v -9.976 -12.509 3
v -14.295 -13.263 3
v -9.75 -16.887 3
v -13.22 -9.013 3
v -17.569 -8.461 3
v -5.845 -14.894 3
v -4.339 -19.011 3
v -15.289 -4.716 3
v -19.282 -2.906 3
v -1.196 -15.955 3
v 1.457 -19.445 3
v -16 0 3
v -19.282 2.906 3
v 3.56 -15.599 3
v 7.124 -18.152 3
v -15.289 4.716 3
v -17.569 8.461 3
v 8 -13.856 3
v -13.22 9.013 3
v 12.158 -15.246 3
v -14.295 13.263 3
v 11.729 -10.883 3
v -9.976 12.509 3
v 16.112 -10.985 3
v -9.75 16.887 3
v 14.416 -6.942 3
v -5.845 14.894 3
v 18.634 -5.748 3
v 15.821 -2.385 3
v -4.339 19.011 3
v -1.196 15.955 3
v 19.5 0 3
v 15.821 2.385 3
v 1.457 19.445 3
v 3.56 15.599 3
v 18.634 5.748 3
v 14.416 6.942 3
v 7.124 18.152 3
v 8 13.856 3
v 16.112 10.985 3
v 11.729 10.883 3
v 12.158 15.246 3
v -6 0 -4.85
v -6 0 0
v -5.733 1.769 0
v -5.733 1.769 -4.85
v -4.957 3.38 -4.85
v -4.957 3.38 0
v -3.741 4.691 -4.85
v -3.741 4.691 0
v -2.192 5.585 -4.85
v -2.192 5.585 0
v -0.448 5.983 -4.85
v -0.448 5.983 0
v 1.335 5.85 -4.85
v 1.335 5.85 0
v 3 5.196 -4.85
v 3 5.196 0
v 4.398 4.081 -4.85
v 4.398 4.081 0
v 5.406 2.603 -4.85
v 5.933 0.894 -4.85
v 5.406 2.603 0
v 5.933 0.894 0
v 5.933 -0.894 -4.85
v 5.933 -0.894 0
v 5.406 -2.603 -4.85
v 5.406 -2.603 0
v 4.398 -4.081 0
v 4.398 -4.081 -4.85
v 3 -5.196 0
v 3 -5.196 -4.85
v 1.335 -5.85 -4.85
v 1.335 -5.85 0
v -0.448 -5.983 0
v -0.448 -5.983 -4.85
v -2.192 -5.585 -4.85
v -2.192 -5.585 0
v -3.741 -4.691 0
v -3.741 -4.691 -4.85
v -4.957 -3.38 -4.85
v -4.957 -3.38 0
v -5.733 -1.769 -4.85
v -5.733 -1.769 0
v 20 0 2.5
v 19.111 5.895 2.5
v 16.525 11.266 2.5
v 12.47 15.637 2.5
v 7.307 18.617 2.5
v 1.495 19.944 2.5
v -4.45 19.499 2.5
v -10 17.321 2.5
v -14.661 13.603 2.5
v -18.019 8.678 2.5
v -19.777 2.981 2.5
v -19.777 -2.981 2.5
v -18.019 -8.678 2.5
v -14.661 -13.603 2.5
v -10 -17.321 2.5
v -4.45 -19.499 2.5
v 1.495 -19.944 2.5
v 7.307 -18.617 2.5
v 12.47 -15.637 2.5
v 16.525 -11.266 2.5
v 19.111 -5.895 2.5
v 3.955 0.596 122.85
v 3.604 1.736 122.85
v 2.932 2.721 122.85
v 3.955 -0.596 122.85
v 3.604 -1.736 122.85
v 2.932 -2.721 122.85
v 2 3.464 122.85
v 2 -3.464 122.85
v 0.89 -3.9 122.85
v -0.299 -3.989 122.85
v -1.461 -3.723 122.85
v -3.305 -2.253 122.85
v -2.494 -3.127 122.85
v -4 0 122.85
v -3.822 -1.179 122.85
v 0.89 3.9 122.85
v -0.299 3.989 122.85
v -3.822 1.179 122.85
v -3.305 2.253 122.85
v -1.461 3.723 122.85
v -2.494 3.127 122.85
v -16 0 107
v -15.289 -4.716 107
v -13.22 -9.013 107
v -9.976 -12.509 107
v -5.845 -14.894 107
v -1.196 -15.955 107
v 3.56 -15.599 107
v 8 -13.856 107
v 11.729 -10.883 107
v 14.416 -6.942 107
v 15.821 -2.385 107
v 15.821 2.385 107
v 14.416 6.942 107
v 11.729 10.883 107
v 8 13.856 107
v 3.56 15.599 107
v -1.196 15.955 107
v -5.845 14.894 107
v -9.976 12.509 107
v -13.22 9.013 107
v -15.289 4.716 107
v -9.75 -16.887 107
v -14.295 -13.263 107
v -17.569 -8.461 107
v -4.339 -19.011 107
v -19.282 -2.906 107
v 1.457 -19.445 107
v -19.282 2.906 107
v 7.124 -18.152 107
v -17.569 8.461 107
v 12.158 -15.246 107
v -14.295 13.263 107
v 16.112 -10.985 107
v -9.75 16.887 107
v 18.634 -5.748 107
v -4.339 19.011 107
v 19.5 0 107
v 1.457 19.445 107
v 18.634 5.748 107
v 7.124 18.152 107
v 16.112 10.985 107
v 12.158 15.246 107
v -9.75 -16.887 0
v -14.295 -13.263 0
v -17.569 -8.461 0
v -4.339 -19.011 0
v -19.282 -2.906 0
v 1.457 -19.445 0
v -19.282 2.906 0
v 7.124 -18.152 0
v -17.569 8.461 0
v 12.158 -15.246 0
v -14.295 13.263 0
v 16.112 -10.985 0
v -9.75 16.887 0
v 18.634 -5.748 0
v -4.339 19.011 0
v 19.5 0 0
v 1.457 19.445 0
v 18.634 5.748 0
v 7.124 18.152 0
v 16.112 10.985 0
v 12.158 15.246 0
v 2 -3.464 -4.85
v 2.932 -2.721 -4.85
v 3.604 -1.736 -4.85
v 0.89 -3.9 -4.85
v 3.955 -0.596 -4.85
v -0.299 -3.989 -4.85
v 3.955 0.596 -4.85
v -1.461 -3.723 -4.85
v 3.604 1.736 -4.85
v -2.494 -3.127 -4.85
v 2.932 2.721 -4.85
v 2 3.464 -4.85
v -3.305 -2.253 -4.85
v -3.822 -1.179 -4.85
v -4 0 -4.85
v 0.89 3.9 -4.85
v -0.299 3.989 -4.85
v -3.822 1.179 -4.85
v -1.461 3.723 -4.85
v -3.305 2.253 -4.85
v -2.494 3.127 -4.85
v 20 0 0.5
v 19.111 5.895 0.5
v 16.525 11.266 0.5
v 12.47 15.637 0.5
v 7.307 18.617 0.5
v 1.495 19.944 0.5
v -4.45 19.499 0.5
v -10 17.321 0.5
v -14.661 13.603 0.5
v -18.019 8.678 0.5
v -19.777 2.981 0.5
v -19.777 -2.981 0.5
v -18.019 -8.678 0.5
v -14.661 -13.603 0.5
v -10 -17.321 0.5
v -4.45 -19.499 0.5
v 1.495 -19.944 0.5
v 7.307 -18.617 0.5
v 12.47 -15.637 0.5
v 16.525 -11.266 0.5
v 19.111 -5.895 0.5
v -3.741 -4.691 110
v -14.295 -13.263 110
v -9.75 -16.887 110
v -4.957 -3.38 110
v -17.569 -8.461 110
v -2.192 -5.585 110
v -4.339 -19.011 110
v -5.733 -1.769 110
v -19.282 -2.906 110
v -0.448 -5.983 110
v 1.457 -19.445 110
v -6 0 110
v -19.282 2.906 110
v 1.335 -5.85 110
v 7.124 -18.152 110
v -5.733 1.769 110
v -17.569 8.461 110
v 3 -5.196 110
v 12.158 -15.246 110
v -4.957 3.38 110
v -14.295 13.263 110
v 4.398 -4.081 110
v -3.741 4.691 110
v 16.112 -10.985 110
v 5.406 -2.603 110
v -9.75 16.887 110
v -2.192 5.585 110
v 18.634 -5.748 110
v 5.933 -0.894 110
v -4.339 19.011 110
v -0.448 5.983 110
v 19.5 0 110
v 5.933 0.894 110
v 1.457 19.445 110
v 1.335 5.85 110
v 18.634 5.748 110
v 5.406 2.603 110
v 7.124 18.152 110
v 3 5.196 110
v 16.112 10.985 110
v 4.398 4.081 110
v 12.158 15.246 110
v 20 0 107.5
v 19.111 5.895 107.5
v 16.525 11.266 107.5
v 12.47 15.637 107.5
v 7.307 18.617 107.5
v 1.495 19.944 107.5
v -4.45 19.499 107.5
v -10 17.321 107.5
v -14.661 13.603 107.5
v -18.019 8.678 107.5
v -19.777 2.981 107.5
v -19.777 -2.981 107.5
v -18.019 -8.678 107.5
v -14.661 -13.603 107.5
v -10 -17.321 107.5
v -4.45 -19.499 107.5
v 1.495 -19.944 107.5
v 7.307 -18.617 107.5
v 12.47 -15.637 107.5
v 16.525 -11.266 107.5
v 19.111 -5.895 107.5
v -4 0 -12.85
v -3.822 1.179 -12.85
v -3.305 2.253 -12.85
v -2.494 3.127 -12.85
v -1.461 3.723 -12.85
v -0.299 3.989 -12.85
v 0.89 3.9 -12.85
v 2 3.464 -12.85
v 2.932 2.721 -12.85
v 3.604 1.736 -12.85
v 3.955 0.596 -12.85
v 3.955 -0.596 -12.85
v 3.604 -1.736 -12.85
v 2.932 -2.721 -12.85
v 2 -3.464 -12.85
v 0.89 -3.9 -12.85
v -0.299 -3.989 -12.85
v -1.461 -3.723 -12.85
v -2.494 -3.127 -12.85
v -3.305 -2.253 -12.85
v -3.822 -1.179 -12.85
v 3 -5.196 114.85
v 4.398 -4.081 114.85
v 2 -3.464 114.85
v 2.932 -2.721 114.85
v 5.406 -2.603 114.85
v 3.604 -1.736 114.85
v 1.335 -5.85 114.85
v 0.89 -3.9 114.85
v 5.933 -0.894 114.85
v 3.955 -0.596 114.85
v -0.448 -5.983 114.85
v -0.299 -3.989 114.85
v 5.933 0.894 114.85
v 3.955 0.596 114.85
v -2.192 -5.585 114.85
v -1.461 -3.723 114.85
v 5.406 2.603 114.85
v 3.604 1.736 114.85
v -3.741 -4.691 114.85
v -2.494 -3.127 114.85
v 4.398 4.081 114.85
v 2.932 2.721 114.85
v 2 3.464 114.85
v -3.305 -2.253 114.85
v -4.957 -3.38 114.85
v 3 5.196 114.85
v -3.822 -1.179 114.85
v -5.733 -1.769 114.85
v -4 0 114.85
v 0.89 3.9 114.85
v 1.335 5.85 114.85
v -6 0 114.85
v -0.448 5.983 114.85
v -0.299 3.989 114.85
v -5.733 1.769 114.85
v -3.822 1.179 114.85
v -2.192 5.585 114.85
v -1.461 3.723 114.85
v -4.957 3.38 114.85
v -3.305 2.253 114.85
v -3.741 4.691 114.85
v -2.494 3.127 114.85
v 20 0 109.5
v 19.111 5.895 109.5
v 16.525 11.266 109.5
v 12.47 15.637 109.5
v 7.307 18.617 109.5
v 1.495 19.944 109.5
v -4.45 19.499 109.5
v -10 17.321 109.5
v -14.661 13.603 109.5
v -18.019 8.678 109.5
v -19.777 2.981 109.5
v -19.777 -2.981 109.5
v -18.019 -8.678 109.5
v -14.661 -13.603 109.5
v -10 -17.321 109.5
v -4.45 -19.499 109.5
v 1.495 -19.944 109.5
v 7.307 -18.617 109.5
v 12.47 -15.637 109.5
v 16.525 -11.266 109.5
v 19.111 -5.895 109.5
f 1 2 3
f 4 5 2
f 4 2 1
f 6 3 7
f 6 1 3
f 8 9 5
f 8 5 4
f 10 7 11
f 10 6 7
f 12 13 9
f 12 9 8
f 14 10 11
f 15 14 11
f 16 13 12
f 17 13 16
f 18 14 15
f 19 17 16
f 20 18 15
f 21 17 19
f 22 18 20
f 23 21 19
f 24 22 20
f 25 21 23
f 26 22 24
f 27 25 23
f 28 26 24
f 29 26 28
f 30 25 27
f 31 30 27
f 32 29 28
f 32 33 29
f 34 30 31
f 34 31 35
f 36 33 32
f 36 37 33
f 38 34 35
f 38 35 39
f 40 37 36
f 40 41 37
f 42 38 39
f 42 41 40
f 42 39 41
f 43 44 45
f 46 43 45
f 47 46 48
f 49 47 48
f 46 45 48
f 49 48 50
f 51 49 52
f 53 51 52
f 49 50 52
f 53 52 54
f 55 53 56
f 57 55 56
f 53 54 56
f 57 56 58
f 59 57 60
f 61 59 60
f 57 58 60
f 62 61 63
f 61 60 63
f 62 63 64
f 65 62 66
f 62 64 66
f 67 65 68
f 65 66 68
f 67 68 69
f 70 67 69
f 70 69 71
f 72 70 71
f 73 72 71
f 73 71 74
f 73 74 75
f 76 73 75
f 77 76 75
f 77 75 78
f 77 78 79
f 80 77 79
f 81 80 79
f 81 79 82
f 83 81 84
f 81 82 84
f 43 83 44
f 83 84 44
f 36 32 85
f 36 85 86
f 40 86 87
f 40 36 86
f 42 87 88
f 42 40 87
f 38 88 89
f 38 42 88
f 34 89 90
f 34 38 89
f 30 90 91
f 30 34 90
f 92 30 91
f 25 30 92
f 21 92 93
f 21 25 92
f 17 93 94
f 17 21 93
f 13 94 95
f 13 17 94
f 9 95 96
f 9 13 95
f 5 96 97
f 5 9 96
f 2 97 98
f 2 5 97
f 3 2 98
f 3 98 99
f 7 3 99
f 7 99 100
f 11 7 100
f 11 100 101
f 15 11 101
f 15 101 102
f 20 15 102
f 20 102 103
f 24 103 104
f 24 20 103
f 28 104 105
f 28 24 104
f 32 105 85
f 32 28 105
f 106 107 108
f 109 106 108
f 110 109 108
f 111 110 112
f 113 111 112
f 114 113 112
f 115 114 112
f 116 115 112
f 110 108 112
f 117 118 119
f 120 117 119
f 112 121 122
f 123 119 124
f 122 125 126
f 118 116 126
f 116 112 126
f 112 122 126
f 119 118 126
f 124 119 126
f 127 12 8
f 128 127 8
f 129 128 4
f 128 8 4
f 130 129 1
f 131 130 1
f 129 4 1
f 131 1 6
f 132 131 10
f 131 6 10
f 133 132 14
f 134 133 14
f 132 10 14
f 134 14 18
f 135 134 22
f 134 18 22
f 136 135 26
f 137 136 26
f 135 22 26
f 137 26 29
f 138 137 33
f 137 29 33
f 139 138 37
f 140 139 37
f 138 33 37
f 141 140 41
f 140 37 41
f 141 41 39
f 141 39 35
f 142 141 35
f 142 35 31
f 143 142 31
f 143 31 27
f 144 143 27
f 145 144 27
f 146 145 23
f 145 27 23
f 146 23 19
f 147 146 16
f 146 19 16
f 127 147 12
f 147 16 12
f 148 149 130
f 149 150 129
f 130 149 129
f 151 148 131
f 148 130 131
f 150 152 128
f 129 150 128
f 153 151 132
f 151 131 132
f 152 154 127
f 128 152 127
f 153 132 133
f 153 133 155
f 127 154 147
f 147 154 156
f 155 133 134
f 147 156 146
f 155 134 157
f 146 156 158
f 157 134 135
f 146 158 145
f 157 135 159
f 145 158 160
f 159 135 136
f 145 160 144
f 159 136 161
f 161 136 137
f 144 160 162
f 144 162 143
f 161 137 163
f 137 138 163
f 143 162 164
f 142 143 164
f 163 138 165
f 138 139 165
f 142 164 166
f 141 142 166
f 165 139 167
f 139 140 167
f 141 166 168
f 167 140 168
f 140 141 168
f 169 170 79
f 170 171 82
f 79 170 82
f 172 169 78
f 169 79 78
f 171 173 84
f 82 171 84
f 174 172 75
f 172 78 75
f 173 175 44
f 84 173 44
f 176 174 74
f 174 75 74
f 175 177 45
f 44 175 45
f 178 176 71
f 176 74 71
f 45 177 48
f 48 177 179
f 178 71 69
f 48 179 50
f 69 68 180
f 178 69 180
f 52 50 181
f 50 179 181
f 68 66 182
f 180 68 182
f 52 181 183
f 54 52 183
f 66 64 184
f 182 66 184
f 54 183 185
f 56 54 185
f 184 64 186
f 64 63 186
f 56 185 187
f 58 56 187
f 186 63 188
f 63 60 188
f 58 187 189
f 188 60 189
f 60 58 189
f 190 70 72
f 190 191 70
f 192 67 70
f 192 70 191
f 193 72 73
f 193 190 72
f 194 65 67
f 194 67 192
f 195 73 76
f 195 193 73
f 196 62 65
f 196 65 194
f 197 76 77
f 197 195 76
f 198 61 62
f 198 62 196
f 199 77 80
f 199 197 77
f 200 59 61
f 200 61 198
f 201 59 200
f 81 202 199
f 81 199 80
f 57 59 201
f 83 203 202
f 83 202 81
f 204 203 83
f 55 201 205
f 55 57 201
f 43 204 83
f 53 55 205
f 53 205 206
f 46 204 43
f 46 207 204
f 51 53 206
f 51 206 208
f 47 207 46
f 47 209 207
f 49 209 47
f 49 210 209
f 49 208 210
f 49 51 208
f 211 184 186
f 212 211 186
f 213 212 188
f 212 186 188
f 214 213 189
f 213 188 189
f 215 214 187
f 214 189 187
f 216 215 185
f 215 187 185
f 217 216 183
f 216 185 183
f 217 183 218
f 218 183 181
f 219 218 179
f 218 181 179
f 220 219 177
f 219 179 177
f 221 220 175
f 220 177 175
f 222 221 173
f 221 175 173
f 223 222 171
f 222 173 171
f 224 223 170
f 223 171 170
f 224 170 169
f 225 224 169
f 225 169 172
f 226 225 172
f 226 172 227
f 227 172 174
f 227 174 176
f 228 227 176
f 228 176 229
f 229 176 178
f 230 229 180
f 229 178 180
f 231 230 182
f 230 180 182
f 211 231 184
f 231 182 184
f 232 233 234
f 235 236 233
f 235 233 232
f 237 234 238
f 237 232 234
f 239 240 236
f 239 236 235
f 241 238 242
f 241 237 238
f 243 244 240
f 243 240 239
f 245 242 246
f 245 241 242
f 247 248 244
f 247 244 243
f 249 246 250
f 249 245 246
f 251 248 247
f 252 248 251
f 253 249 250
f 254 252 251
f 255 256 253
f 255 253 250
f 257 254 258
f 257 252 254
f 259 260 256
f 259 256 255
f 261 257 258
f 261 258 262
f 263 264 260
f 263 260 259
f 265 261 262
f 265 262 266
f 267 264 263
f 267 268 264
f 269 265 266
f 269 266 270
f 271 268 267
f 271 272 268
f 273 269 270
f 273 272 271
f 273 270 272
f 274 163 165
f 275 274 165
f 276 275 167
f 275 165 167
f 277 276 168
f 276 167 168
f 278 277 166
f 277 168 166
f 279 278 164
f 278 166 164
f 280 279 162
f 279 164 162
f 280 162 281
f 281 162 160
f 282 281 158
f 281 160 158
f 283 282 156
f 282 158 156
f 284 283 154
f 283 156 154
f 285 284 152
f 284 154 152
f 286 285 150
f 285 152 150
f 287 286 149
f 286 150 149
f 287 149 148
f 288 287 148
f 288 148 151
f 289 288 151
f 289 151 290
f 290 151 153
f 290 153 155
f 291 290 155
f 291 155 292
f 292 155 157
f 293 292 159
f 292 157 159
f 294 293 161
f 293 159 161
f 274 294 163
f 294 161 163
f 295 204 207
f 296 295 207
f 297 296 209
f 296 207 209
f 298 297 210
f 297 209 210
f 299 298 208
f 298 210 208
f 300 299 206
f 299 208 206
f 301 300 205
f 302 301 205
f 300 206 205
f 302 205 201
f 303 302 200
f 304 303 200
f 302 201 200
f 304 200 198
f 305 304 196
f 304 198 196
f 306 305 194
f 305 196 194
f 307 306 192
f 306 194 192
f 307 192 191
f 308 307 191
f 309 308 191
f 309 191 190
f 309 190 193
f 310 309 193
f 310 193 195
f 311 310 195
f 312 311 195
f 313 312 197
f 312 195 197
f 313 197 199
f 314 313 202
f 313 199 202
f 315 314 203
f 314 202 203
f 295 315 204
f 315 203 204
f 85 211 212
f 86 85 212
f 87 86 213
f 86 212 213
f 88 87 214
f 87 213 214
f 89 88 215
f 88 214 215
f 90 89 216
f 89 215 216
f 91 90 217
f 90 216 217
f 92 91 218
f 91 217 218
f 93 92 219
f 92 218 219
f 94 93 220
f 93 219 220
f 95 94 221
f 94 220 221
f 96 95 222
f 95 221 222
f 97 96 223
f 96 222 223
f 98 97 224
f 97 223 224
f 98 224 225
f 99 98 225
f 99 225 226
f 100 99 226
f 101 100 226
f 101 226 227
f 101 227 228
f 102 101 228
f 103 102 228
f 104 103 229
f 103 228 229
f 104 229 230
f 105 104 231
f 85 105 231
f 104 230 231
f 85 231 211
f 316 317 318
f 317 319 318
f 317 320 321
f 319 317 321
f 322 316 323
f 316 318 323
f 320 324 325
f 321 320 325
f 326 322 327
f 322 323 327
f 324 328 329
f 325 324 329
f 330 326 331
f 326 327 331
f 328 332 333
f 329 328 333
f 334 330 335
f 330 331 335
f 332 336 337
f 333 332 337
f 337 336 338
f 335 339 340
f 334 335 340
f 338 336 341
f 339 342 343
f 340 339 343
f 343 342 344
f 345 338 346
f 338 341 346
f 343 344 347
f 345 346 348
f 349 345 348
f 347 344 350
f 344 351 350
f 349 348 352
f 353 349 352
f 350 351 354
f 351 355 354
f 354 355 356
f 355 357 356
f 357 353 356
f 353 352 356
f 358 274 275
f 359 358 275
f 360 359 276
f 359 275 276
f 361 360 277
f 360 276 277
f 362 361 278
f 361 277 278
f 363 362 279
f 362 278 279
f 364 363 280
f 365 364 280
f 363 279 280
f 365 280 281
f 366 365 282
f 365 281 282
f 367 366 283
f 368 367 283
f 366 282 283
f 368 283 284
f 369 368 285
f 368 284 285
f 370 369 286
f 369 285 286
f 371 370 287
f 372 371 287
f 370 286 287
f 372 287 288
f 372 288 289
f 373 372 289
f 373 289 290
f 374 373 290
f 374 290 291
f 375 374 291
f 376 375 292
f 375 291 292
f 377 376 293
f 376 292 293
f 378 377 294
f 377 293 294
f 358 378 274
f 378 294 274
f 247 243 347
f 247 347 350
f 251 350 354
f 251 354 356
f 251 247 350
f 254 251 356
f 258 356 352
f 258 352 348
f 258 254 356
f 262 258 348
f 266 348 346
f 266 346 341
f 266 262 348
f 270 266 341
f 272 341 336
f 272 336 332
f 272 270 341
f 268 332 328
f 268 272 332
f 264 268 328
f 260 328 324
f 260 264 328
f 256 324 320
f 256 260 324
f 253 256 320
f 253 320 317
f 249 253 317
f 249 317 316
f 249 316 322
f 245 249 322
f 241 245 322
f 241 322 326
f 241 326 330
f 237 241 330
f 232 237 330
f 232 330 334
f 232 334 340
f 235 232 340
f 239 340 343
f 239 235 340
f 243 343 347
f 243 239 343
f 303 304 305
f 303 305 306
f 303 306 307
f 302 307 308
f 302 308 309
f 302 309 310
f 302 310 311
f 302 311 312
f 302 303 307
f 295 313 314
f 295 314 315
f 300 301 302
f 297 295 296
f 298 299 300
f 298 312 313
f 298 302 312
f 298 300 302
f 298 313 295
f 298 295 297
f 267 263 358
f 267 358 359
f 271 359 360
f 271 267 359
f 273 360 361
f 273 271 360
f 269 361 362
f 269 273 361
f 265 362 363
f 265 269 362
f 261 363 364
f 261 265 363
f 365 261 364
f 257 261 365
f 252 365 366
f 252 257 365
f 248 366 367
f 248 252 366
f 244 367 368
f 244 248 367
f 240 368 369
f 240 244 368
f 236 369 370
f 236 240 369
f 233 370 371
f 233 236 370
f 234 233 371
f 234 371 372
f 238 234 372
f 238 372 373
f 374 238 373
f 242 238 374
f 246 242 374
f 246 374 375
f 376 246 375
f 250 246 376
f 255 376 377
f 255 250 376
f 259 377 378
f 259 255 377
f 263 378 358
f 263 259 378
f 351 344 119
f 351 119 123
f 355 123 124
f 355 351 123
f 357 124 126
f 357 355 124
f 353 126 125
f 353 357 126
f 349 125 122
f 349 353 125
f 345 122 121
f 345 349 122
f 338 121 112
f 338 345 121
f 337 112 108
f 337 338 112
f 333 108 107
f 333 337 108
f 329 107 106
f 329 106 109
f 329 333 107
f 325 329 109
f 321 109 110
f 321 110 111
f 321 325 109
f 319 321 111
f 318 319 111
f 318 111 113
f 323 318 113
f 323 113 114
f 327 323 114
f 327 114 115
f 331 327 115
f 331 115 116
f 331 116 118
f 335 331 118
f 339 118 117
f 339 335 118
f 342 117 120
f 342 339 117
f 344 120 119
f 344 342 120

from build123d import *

# Parameters (mm, degrees)
SKETCH1_R           = 20
BOSS_EXTRUDE1_DEPTH = 3
CHAMFER1_SIZE       = 0.5
SKETCH2_R           = 16
BOSS_EXTRUDE2_DEPTH = 104
SKETCH3_R           = 20
BOSS_EXTRUDE3_DEPTH = 3
CHAMFER2_SIZE       = 0.5
SKETCH4_R           = 6
BOSS_EXTRUDE4_DEPTH = 4.85
SKETCH5_R           = 4
BOSS_EXTRUDE5_DEPTH = 8


with BuildPart() as part:
    # Sketch1 → Boss-Extrude1 (new body)
    with BuildSketch(Plane.XY):
        Circle(SKETCH1_R)
    extrude(amount=BOSS_EXTRUDE1_DEPTH)

    # Chamfer1
    chamfer1_edges = [part.edges().sort_by_distance(p)[0] for p in [
        (-20, 0, 0),
        (-20, 0, 3),
    ]]
    chamfer(chamfer1_edges, length=CHAMFER1_SIZE)

    # Sketch2 → Boss-Extrude2 (add)
    with BuildSketch(Plane.XY.offset(3)):
        with Locations(Location((0, 0, 0), (0, 0, 180))):
            Circle(SKETCH2_R)
    extrude(amount=BOSS_EXTRUDE2_DEPTH)

    # Sketch3 → Boss-Extrude3 (add)
    with BuildSketch(Plane.XY.offset(107)):
        Circle(SKETCH3_R)
    extrude(amount=BOSS_EXTRUDE3_DEPTH)

    # Chamfer2
    chamfer2_edges = [part.edges().sort_by_distance(p)[0] for p in [
        (-20, 0, 107),
        (-20, 0, 110),
    ]]
    chamfer(chamfer2_edges, length=CHAMFER2_SIZE)

    # Sketch4 → Boss-Extrude4 (add)
    with BuildSketch(Plane(origin=(0, 0, 0), x_dir=(-1, 0, 0), z_dir=(0, 0, -1))):
        Circle(SKETCH4_R)
    boss_extrude4 = extrude(amount=BOSS_EXTRUDE4_DEPTH)

    # Sketch5 → Boss-Extrude5 (add)
    with BuildSketch(Plane(origin=(0, 0, -4.85), x_dir=(-1, 0, 0), z_dir=(0, 0, -1))):
        Circle(SKETCH5_R)
    boss_extrude5 = extrude(amount=BOSS_EXTRUDE5_DEPTH)

    # Mirror2: Boss-Extrude4, Boss-Extrude5 across plane
    add(boss_extrude4.mirror(Plane(origin=(0, 0, 55), x_dir=(1, 0, 0), z_dir=(0, 0, -1))))
    add(boss_extrude5.mirror(Plane(origin=(0, 0, 55), x_dir=(1, 0, 0), z_dir=(0, 0, -1))))


solid = part.part
